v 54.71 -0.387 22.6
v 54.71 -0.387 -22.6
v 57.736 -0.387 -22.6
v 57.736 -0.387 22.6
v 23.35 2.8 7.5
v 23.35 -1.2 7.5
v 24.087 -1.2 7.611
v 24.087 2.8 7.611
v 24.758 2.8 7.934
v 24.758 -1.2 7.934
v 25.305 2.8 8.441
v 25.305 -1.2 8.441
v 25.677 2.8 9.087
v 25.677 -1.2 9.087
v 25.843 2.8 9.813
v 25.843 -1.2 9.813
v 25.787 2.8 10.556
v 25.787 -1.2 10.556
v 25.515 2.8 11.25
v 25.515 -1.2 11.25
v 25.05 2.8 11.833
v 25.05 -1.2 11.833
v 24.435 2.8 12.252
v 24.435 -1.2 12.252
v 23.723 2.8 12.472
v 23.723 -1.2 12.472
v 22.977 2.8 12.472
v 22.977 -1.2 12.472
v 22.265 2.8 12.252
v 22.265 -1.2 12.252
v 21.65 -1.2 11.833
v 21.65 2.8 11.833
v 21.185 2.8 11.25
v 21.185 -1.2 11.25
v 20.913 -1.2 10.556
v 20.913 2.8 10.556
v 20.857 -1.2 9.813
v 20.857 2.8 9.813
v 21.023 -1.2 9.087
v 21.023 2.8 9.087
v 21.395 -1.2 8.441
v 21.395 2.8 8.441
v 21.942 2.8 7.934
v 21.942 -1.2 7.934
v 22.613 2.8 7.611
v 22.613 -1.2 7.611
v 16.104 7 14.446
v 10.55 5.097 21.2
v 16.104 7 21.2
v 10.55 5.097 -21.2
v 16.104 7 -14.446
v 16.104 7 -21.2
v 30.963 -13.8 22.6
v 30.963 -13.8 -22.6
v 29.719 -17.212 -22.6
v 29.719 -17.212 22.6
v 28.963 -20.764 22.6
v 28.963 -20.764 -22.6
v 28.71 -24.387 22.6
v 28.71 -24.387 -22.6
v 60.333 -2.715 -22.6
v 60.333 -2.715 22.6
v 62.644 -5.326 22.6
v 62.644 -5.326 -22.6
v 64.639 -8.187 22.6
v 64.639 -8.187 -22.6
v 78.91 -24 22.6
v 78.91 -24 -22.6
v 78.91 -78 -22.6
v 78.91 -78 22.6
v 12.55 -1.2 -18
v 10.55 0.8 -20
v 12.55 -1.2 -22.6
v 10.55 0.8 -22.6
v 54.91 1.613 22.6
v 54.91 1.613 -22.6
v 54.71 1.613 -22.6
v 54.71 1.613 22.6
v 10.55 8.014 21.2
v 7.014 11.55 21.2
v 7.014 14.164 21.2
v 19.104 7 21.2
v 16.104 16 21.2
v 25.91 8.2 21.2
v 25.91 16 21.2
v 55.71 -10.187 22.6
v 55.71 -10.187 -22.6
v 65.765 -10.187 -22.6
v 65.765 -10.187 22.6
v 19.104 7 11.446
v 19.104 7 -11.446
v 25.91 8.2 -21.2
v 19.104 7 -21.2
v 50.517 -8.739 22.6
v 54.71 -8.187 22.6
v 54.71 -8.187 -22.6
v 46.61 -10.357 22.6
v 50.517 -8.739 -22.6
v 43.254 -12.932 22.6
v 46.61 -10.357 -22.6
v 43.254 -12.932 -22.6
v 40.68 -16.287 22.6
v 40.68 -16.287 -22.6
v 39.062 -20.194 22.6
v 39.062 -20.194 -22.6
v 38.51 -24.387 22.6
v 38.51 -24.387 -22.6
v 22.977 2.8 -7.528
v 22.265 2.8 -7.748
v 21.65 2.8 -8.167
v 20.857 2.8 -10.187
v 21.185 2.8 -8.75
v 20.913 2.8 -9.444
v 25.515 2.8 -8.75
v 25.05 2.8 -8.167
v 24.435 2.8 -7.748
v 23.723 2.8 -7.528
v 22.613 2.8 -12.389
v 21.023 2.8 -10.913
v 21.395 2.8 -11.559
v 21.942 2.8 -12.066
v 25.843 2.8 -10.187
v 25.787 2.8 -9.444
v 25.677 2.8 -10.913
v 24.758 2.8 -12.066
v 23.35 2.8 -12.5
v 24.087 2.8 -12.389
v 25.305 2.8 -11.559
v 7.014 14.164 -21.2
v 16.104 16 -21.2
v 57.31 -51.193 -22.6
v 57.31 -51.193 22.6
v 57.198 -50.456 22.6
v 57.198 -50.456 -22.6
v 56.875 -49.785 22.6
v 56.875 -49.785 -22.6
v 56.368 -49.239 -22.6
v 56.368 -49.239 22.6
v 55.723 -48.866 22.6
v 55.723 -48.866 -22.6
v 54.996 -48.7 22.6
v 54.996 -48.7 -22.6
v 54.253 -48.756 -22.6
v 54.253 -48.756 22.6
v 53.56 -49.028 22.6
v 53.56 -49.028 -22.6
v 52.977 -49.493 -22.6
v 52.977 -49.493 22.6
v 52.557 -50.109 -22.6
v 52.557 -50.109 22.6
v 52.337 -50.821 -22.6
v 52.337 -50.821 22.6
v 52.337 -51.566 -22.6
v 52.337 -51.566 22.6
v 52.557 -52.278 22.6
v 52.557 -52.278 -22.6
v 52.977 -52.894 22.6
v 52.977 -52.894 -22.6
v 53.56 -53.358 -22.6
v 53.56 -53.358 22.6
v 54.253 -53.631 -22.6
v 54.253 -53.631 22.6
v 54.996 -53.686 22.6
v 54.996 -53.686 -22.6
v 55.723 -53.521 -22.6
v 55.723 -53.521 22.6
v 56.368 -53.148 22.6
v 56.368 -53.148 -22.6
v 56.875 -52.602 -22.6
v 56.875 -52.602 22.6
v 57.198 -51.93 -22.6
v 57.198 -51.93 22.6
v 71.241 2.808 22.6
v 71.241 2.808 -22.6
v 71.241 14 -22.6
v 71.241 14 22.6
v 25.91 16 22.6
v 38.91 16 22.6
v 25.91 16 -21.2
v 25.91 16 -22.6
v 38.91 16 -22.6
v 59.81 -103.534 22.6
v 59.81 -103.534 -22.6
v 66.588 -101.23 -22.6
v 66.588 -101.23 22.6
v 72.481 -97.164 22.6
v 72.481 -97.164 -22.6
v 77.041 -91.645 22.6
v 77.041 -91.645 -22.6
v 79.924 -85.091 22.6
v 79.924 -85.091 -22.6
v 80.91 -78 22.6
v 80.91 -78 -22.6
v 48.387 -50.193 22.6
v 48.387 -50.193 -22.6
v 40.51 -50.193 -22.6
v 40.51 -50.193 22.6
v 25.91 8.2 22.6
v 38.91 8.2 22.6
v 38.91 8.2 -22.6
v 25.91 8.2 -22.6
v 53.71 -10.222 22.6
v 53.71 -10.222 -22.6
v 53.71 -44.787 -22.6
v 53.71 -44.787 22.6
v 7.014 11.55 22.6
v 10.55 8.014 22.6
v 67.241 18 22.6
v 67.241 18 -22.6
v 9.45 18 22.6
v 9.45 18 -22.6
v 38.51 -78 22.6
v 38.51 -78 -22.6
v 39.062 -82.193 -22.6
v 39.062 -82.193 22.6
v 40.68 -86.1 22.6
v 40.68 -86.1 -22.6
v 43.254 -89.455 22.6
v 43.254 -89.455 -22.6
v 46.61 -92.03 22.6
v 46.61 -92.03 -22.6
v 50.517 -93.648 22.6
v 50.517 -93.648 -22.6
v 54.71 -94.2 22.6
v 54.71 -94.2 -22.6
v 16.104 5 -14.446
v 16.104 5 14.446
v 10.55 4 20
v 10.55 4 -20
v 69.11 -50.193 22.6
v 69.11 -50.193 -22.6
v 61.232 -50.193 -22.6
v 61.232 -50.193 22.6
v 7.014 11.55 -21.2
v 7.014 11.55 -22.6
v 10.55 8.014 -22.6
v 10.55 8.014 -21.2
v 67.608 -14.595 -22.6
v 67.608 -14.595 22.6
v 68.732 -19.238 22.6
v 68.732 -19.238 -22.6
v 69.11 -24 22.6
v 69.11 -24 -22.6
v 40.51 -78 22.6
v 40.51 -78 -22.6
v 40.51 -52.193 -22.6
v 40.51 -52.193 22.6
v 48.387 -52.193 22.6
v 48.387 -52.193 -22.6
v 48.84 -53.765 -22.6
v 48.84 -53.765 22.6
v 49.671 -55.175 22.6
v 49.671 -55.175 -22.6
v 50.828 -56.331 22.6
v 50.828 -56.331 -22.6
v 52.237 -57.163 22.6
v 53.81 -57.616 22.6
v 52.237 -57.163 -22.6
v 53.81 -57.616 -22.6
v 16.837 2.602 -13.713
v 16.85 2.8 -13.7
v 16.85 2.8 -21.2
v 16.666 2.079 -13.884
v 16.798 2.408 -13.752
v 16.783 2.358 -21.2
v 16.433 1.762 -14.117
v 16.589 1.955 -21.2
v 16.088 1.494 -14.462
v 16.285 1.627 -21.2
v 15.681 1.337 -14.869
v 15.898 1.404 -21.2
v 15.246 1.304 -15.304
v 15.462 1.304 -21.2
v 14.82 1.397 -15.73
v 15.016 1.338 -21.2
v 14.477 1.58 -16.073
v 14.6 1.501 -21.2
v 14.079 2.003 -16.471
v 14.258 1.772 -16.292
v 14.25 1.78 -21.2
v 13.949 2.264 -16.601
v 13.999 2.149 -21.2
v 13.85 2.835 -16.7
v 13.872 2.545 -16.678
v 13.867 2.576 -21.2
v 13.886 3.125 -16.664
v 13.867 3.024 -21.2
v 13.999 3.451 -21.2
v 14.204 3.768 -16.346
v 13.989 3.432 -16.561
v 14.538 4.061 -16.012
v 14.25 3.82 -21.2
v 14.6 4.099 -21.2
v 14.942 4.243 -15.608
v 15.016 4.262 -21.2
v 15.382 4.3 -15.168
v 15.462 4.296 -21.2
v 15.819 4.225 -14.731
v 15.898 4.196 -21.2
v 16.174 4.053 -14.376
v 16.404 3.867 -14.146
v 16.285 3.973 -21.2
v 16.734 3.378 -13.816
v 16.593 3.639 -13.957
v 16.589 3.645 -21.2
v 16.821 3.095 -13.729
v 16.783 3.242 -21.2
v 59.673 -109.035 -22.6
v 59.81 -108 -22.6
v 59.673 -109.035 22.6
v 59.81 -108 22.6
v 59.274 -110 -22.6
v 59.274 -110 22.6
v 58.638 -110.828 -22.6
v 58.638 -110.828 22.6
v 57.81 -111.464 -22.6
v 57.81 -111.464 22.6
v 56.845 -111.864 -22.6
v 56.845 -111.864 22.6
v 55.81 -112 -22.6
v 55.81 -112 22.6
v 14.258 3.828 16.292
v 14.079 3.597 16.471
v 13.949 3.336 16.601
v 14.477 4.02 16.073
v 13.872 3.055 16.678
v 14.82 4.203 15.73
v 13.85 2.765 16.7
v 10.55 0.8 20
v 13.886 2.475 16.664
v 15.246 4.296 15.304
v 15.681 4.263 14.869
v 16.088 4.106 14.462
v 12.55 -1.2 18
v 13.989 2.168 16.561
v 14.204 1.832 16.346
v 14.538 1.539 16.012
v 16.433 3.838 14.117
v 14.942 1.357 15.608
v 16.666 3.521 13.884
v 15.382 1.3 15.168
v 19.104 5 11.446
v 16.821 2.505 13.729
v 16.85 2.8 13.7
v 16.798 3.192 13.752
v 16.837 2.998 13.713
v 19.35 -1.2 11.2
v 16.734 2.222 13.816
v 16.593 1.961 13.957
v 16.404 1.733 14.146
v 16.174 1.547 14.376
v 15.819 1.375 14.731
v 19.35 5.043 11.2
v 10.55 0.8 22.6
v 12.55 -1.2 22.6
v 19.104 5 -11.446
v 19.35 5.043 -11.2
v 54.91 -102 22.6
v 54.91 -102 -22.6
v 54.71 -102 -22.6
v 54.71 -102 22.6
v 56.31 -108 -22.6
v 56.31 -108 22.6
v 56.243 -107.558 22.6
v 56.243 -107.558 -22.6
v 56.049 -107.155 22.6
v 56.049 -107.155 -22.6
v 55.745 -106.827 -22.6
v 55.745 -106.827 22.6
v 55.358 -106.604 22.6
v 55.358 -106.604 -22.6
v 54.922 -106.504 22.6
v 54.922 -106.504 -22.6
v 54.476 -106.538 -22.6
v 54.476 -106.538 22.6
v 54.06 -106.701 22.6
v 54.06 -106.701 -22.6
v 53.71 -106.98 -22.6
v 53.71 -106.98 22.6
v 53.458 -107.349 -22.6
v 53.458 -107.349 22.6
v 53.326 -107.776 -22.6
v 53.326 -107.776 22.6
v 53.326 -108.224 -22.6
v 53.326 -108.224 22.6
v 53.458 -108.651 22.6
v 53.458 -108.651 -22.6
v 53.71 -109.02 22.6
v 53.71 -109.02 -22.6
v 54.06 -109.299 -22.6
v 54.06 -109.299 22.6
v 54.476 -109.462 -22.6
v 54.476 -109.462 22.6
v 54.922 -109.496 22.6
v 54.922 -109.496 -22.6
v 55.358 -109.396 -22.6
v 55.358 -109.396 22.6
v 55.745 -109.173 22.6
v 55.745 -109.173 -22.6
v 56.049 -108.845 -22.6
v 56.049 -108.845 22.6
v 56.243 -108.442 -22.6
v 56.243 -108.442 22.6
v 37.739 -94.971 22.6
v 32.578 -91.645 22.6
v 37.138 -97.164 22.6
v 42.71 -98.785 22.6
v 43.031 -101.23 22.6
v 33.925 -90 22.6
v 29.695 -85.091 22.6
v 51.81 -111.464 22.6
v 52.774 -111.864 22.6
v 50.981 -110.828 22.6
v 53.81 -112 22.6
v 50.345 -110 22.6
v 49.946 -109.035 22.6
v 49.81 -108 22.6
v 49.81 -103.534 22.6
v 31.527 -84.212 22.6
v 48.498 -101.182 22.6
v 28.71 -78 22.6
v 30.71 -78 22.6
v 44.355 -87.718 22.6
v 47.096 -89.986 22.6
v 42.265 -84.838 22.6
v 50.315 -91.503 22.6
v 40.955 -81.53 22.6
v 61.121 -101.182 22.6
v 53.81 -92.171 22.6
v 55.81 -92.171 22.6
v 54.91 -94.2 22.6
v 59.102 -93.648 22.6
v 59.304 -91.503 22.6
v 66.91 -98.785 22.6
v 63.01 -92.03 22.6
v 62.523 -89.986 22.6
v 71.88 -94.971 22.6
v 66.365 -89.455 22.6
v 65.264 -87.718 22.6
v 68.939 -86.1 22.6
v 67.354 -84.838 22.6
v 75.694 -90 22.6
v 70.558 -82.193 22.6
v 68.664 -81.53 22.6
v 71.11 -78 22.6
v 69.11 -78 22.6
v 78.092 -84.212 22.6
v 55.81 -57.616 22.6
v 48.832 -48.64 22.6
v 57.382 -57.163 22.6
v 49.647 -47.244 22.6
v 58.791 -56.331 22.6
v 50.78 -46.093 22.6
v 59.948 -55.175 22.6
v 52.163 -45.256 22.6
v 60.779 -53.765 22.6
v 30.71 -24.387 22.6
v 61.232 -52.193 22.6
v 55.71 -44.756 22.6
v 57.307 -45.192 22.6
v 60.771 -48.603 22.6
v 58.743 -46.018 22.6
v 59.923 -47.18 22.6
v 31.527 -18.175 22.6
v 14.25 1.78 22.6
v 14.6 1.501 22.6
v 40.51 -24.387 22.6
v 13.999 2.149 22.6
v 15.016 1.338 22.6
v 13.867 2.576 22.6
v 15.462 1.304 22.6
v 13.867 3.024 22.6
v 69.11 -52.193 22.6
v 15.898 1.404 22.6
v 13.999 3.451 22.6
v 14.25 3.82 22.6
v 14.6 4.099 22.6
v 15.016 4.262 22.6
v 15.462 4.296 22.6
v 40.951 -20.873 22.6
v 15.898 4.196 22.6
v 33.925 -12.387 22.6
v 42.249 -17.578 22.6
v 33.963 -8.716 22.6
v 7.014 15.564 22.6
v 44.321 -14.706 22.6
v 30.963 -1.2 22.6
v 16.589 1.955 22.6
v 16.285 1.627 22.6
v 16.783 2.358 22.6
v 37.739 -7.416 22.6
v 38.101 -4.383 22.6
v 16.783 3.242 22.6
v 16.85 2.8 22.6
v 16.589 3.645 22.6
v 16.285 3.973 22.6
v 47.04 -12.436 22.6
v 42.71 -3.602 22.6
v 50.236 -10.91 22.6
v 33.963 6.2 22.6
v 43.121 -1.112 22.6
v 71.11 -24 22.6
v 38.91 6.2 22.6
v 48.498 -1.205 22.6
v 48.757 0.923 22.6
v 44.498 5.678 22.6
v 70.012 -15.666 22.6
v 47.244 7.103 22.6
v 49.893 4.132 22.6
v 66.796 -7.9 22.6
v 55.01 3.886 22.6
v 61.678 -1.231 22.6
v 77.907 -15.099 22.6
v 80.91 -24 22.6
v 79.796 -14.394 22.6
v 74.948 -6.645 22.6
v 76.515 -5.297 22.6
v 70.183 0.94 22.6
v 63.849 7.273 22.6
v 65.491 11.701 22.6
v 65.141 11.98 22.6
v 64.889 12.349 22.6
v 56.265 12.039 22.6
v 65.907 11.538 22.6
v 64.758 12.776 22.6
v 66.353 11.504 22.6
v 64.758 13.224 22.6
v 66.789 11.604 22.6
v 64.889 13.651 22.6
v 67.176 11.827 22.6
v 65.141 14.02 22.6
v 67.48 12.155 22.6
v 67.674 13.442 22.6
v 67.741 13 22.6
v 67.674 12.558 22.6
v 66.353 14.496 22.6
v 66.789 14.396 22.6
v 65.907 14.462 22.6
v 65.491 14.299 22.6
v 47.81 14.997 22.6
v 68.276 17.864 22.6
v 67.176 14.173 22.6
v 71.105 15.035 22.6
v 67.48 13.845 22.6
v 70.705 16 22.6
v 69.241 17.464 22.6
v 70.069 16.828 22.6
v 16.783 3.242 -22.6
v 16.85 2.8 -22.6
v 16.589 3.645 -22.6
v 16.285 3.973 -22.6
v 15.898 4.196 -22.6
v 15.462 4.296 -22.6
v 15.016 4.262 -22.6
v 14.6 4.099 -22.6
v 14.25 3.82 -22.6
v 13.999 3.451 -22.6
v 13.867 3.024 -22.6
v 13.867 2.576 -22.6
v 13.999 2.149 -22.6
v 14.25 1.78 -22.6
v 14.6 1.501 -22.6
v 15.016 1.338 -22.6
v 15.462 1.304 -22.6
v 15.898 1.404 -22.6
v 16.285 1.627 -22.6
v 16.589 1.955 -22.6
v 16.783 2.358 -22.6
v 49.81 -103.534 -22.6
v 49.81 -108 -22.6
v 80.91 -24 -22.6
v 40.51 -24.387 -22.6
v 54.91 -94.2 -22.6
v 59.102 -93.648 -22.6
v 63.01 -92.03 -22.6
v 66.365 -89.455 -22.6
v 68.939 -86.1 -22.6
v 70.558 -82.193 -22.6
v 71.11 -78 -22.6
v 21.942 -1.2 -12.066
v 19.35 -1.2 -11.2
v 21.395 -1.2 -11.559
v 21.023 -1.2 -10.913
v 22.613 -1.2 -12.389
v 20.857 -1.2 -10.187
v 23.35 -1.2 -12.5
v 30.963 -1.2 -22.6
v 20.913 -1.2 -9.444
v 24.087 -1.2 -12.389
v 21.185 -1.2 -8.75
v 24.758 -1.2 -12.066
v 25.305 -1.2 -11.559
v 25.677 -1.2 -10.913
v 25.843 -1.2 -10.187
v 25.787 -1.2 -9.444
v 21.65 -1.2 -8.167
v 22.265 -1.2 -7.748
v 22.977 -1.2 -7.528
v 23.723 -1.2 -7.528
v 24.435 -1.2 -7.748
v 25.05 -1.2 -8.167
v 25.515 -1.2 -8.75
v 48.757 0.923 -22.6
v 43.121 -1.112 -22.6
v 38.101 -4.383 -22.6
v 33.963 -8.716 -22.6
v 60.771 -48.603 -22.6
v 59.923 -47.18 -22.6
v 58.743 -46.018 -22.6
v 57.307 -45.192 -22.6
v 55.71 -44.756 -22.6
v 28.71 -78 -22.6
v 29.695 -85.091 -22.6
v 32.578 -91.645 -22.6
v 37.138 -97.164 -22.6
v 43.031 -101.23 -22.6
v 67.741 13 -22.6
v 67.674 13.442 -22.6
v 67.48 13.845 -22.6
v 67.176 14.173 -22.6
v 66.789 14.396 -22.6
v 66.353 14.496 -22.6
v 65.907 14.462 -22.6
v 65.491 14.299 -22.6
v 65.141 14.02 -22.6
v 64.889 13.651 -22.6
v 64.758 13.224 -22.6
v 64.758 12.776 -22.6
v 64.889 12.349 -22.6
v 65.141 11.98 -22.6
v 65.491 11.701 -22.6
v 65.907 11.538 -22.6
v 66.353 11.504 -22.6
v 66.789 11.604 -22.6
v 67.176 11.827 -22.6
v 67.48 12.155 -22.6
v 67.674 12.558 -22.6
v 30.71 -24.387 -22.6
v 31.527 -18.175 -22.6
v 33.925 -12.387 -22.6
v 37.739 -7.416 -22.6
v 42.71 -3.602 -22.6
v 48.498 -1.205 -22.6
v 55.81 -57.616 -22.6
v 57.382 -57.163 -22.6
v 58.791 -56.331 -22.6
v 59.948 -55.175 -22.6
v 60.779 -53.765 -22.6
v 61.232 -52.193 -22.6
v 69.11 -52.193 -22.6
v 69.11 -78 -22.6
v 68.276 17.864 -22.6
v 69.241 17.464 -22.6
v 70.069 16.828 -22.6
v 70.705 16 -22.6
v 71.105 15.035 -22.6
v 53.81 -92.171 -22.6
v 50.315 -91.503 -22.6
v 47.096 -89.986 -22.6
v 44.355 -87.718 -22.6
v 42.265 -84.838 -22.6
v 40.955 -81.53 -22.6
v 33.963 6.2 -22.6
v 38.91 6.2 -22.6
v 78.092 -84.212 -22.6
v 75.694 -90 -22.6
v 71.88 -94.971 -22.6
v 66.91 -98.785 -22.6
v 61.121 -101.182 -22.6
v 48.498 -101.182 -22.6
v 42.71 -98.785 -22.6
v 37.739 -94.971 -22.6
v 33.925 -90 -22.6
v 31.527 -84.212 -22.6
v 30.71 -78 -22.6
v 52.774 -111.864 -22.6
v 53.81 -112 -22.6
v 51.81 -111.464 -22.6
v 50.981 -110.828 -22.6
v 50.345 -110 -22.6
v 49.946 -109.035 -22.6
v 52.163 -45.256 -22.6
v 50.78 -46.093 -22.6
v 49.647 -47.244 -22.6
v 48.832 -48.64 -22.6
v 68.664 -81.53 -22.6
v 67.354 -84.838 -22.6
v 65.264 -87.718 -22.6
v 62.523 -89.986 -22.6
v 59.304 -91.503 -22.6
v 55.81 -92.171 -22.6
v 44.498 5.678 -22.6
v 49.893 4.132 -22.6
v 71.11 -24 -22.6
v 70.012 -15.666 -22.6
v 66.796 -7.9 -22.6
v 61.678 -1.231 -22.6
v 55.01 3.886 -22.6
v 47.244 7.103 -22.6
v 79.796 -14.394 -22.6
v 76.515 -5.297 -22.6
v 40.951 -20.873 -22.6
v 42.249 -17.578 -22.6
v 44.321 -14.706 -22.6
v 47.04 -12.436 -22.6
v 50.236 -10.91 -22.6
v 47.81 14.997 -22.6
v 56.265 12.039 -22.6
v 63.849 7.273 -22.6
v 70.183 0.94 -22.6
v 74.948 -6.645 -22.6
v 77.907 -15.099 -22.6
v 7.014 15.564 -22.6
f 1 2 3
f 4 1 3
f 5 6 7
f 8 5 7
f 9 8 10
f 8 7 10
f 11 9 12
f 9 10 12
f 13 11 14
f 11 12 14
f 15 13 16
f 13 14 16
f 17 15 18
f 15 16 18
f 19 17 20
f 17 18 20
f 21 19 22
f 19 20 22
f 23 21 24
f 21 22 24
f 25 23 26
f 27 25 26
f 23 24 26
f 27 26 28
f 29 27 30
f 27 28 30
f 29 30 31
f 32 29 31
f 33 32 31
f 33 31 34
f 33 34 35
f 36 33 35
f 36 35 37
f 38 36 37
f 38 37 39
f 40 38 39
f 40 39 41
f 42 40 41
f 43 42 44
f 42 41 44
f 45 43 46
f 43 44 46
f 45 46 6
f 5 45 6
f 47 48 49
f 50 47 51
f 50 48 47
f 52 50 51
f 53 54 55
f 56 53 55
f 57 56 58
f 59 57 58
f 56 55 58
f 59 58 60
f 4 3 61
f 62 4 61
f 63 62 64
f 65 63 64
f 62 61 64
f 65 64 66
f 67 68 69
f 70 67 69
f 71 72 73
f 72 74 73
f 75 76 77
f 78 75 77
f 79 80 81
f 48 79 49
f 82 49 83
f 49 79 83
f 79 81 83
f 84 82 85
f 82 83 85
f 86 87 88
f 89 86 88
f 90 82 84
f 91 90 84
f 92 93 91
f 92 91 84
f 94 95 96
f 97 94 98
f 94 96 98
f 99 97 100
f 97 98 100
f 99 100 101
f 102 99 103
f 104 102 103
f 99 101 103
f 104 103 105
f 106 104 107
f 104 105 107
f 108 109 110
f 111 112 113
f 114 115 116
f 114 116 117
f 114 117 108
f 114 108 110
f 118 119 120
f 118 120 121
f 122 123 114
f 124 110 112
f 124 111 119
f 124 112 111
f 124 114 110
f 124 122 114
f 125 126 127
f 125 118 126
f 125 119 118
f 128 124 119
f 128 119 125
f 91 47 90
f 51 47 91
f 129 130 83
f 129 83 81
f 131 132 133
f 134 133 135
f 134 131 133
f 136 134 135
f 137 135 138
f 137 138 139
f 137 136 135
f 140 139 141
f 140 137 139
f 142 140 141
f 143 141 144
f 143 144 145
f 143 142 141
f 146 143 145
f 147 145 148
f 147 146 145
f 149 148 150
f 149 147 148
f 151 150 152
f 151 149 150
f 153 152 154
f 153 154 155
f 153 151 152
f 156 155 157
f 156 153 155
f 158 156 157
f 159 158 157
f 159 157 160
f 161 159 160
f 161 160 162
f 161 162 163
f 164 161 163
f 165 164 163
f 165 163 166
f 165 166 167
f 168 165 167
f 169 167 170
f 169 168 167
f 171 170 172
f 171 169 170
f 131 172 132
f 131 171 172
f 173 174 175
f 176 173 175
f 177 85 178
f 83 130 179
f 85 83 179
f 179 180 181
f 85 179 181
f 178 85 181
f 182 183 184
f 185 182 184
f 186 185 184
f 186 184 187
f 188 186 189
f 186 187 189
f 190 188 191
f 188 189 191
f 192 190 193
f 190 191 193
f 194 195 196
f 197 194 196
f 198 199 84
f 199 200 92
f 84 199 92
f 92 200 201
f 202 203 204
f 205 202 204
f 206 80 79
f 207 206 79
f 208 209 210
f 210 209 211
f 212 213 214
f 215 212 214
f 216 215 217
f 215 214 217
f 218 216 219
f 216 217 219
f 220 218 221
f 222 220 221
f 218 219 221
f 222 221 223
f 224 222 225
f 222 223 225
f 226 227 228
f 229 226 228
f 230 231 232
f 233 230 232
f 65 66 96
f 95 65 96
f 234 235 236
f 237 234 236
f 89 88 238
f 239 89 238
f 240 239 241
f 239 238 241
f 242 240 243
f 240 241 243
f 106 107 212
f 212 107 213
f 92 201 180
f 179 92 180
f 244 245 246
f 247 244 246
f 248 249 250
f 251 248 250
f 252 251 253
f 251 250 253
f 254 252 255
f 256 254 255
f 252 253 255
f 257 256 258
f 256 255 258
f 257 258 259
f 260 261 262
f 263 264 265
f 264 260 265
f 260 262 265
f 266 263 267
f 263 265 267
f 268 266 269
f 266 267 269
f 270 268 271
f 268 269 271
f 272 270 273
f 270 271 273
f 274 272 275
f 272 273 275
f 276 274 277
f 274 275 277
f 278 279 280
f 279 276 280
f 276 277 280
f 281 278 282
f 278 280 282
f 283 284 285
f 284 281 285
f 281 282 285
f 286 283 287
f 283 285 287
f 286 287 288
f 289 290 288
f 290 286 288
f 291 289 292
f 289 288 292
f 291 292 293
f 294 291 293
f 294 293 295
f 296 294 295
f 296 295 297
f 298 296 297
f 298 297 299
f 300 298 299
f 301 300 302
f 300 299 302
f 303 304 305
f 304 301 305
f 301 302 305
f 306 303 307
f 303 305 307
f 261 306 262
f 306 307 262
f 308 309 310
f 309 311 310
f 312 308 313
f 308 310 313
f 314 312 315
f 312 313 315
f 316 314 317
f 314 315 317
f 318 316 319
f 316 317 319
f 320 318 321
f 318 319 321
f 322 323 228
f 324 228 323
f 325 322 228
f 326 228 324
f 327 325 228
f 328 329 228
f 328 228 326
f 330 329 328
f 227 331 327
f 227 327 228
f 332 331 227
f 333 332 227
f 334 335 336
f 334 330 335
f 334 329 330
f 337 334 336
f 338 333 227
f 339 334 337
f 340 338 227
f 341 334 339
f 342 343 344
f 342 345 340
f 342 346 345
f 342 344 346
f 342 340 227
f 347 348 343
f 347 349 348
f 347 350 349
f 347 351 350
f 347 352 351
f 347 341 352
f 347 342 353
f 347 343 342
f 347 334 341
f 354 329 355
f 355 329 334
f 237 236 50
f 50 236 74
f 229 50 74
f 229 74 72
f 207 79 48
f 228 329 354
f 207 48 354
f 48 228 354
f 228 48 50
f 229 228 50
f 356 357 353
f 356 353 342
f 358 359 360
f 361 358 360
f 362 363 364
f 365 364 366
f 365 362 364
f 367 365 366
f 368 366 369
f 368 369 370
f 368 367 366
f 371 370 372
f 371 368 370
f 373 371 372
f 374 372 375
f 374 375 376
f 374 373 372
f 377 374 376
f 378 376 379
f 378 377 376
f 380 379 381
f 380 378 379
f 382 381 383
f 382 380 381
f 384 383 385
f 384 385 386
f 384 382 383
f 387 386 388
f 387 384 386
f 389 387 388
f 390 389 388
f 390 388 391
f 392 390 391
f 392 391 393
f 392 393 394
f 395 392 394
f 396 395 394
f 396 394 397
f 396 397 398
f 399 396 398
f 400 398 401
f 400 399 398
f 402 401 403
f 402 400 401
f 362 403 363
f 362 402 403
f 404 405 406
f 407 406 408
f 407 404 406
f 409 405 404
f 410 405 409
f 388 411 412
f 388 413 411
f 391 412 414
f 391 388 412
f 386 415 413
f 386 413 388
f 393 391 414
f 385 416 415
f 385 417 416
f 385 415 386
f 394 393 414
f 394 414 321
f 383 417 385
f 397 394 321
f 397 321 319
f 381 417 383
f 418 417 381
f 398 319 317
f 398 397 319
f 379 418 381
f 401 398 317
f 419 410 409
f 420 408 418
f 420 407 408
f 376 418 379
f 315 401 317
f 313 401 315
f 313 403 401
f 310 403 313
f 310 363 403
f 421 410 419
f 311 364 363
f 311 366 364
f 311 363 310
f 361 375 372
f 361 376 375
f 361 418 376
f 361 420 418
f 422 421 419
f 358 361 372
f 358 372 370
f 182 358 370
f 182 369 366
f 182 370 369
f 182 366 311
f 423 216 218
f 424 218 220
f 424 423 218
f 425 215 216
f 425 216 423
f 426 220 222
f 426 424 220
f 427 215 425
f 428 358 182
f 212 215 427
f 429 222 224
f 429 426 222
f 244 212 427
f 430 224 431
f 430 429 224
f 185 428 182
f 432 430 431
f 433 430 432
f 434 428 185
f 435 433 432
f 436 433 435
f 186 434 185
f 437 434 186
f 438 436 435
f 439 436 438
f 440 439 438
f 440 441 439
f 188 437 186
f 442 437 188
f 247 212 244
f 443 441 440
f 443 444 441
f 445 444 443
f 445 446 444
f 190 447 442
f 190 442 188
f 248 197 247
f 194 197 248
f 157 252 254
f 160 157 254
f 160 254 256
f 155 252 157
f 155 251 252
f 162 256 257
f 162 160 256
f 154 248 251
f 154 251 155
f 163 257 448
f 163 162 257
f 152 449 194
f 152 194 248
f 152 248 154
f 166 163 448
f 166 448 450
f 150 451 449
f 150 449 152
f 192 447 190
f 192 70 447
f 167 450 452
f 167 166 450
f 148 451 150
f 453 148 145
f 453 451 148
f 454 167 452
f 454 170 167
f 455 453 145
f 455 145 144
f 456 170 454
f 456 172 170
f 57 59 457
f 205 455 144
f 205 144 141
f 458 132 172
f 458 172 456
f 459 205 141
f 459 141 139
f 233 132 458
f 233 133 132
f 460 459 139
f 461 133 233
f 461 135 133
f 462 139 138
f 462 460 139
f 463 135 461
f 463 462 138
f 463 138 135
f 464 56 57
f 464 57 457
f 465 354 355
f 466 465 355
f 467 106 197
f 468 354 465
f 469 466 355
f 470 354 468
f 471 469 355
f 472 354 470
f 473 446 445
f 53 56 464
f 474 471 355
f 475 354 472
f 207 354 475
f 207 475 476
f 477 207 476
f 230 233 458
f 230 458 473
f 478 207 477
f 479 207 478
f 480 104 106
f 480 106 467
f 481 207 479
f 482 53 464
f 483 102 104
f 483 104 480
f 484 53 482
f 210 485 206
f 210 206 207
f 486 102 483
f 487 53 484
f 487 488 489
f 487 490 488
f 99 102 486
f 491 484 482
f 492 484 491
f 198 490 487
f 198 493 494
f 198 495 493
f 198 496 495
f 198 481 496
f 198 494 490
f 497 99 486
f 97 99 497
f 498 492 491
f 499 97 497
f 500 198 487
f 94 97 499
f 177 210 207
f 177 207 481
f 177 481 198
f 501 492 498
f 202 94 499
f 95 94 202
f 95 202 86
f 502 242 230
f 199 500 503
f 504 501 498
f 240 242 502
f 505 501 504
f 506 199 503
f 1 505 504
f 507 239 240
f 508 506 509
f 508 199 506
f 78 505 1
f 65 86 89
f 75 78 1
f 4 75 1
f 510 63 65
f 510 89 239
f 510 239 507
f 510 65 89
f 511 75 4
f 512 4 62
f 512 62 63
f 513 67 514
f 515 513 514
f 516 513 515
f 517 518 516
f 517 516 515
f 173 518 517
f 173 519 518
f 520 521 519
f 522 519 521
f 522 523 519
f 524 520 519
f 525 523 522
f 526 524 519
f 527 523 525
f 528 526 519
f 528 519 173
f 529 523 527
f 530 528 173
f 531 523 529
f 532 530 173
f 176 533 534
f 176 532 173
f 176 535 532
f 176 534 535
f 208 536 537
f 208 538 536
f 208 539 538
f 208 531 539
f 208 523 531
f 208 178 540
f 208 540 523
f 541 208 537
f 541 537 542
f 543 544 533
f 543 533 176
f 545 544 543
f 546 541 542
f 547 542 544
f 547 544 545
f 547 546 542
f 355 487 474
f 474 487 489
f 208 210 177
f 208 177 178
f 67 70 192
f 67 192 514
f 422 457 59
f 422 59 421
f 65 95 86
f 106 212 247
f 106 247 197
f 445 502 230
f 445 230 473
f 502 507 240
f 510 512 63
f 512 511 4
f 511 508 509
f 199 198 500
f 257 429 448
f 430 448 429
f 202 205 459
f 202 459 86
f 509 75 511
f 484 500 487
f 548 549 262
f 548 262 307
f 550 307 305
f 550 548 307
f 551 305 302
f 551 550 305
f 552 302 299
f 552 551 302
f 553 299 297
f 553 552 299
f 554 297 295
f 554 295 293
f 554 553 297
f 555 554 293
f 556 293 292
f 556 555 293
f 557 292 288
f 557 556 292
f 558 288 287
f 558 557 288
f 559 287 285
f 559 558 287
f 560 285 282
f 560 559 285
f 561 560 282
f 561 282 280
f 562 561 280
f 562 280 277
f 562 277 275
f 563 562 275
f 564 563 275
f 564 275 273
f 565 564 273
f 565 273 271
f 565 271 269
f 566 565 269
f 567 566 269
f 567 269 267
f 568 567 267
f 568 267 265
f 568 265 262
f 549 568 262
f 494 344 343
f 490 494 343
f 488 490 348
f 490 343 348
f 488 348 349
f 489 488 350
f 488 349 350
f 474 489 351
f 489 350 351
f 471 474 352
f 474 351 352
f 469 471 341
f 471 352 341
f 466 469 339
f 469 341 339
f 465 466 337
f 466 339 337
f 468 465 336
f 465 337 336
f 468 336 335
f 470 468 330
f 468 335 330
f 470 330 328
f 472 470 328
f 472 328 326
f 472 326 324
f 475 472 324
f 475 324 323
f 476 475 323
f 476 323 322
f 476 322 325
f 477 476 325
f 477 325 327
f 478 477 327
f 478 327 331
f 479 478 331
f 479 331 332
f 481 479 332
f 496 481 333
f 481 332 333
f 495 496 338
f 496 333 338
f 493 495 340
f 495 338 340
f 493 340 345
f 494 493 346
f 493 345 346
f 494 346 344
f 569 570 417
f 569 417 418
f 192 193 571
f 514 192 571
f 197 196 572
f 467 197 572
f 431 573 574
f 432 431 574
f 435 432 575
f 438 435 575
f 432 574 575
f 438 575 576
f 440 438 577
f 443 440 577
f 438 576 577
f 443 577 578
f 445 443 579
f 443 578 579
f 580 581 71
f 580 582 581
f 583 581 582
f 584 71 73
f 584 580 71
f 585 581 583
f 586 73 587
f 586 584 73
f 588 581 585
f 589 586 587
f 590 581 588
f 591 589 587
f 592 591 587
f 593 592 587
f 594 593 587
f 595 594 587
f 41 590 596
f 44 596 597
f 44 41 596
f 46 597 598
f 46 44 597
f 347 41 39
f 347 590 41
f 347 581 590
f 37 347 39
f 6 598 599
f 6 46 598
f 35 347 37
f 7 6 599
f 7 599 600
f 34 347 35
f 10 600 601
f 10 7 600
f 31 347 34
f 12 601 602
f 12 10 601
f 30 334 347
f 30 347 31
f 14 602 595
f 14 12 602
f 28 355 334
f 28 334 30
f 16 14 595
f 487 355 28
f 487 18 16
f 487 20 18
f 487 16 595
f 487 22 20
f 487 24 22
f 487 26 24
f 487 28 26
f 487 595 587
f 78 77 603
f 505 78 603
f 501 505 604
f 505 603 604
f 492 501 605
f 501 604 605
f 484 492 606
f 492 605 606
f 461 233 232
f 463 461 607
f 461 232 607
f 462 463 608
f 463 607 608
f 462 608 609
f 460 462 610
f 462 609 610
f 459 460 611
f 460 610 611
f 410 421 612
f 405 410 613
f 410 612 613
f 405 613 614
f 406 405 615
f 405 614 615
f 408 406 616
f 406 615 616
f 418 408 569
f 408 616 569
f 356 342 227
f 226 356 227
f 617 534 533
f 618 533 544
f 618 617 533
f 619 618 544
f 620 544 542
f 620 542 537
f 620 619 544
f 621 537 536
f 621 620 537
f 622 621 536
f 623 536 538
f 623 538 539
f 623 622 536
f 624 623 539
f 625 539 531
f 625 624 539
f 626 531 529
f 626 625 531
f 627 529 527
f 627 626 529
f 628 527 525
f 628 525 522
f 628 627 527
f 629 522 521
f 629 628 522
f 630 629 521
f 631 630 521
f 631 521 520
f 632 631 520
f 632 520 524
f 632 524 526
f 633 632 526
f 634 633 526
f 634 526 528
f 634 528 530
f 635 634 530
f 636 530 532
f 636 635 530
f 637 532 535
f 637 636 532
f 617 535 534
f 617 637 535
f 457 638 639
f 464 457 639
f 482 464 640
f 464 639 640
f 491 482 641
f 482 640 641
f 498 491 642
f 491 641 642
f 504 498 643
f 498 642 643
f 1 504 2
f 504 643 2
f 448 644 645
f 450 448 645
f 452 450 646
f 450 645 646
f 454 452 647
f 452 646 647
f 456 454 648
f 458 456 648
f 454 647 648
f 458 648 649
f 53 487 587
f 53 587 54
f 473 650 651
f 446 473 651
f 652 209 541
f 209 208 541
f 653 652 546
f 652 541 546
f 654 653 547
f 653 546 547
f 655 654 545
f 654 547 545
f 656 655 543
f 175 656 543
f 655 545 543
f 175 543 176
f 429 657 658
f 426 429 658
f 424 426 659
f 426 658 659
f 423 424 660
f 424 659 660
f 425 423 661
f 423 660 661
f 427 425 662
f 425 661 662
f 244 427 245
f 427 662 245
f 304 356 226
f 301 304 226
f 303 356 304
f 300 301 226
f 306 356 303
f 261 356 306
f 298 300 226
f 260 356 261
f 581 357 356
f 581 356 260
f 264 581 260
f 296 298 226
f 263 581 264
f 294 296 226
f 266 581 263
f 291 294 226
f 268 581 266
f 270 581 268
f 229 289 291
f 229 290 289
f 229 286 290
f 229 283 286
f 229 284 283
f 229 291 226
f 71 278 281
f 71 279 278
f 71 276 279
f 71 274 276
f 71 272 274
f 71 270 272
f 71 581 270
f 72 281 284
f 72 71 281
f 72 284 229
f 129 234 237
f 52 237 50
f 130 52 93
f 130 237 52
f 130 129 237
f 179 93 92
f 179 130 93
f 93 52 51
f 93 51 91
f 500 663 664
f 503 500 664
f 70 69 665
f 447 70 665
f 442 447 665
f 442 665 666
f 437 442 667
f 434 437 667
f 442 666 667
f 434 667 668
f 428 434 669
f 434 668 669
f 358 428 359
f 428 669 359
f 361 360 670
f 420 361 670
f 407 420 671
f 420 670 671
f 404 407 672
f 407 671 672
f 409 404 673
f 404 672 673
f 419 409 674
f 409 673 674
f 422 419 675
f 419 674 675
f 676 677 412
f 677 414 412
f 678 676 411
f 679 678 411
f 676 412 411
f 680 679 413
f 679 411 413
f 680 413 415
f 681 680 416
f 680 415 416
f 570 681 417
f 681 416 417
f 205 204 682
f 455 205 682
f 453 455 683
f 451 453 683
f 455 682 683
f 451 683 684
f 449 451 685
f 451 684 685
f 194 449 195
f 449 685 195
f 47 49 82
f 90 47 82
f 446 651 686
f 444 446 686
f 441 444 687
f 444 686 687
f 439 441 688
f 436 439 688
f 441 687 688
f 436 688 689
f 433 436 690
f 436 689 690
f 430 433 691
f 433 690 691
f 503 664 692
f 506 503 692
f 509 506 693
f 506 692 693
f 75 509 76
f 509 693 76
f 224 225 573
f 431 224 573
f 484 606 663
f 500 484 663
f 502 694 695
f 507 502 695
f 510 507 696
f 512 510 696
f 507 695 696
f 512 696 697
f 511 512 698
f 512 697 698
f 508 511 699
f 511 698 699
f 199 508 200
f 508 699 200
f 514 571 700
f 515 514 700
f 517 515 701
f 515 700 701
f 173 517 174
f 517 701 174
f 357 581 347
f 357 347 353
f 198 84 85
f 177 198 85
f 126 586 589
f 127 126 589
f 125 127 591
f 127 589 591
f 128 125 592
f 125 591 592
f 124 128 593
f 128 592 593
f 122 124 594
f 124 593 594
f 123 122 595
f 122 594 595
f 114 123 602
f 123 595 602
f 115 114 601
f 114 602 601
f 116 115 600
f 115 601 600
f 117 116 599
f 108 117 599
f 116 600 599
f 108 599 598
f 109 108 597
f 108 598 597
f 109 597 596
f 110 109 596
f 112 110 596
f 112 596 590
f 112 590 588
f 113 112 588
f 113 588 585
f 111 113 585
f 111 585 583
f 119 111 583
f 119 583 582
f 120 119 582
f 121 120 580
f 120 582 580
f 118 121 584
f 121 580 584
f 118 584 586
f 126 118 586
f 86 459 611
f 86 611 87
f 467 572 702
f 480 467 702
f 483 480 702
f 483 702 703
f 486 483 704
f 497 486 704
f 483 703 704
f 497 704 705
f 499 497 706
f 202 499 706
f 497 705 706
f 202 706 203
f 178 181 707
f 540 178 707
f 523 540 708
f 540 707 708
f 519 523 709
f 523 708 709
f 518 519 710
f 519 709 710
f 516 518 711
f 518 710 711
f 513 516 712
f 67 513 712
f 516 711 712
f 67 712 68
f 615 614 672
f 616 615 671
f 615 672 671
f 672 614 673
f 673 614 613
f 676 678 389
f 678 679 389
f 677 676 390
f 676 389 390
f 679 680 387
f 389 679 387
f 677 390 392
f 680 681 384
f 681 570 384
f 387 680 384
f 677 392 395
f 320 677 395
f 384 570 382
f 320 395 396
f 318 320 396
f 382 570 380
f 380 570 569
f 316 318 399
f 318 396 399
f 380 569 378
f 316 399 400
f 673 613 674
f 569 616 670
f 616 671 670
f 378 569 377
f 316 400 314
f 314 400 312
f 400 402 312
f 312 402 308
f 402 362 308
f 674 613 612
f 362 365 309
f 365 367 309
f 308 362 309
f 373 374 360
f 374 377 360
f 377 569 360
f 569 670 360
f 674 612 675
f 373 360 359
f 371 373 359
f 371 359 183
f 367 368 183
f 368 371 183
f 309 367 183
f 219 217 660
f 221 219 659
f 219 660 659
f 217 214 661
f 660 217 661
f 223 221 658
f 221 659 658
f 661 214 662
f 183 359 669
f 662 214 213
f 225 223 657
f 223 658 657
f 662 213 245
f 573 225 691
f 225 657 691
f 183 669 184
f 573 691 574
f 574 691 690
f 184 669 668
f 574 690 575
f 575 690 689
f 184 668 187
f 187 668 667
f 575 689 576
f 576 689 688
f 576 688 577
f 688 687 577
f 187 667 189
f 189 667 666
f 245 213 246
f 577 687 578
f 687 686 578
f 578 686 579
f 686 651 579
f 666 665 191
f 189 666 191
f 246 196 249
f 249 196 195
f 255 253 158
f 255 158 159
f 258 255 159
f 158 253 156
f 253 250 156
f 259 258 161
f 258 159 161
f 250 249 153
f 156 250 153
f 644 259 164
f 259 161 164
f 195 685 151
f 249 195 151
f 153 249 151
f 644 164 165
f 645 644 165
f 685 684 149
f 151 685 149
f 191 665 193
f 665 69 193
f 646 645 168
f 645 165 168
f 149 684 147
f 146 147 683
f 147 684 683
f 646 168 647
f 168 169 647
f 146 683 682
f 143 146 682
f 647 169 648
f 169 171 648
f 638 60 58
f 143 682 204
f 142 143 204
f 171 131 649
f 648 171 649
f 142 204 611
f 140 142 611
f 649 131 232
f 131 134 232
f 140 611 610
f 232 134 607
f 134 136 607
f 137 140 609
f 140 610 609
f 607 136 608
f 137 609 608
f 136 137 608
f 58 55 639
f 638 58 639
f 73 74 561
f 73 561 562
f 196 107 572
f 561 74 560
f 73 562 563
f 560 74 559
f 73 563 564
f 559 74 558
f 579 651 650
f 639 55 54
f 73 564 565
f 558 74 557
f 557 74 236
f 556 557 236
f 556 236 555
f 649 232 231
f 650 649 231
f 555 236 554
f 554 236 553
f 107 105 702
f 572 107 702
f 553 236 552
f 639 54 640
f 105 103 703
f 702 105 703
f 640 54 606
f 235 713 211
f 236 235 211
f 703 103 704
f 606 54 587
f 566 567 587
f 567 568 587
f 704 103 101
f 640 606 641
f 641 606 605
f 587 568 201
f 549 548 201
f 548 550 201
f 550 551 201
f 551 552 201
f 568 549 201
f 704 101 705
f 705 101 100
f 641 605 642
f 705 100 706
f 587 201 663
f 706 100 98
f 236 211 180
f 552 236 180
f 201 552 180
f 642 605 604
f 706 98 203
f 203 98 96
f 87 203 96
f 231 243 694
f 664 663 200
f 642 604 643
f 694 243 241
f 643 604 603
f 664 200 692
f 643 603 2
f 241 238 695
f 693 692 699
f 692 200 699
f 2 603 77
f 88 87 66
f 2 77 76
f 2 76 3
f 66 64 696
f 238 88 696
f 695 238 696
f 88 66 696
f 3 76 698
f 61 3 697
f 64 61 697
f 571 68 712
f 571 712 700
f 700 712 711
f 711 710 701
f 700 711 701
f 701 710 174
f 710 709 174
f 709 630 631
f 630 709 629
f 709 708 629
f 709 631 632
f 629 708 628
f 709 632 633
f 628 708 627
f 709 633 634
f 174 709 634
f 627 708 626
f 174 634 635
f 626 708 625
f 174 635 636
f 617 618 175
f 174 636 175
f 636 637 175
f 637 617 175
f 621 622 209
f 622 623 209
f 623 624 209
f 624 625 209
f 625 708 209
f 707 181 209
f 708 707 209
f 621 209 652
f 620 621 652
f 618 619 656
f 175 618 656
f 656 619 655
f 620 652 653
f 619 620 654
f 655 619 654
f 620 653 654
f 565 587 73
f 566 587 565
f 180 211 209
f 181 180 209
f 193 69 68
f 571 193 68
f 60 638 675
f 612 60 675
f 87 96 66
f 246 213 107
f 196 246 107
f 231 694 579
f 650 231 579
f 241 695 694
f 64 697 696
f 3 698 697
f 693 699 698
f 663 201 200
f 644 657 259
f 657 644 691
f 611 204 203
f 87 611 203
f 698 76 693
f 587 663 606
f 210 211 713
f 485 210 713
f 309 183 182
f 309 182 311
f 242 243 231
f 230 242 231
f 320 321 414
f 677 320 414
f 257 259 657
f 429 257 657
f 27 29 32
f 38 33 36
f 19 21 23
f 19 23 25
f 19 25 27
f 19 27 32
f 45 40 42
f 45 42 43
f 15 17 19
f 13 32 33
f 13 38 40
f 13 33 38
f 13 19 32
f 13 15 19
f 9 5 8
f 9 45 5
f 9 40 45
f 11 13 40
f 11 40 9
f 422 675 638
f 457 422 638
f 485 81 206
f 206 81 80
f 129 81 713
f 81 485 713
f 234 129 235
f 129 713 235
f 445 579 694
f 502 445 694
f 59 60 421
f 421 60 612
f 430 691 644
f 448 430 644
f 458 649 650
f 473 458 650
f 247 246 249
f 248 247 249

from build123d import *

# Parameters (mm, degrees)
BOSS_EXTRUDE6_DEPTH      = 22.6
BOSS_EXTRUDE6_DEPTH_BACK = 22.6
SKETCH9_R                = 1.5
BOSS_EXTRUDE7_START      = -22.6
BOSS_EXTRUDE7_OUTLINE_R  = 2.5
BOSS_EXTRUDE7_DEPTH      = 45.2
CUT_EXTRUDE1_DEPTH       = 21.2
CUT_EXTRUDE1_DEPTH_BACK  = 21.2
SKETCH9_30_R             = 1.5
BOSS_EXTRUDE8_DEPTH      = 22.6
BOSS_EXTRUDE8_DEPTH_BACK = 22.6
SKETCH9_31_R             = 1.5
FILLET1_R                = 4
CHAMFER1_SIZE            = 2
CHAMFER2_SIZE            = 10
SKETCH11_R               = 2.5
CUT_EXTRUDE5_DEPTH       = 4


# Read off the part's stored shape, not the designer's step: Boss-Extrude7
with BuildPart() as part:
    # Sketch9 → Boss-Extrude6 (new, two sides: drawn at the far end of the back side and taken through both)
    with BuildSketch(Plane.XY.offset(-BOSS_EXTRUDE6_DEPTH_BACK)):
        Polygon((10.55, -1.2), (30.962513099, -1.2), (30.962513099, 6.2), (25.90954056, 6.2), (25.90954056, 8.2), (25.90954056, 18), (9.45, 18), (7.014466094, 15.564466094), (7.014466094, 11.55), (10.55, 8.014466094), align=None)
        with Locations((15.35, 2.8)):
            Circle(SKETCH9_R, mode=Mode.SUBTRACT)
    extrude(amount=BOSS_EXTRUDE6_DEPTH + BOSS_EXTRUDE6_DEPTH_BACK)

    # Boss-Extrude7 outline → Boss-Extrude7 (add)
    with BuildSketch(Plane.XY.offset(BOSS_EXTRUDE7_START)):
        with BuildLine():
            Line((38.90954056, 18), (25.90954056, 18))
            Line((25.90954056, 18), (25.90954056, 16))
            Line((25.90954056, 16), (38.90954056, 16))
            ThreePointArc((38.90954056, 16), (67.193811807, 4.284271247), (78.90954056, -24))
            Line((78.90954056, -24), (78.90954056, -78))
            ThreePointArc((78.90954056, -78), (71.880103308, -94.970562748), (54.90954056, -102))
            Line((54.90954056, -102), (54.709540559, -102))
            ThreePointArc((54.709540559, -102), (37.738977811, -94.970562748), (30.709540559, -78))
            Line((30.709540559, -78), (30.709540559, -24.386722193))
            ThreePointArc((30.709540559, -24.386722193), (37.738977811, -7.416159445), (54.709540559, -0.386722193))
            Line((54.709540559, -0.386722193), (57.736465726, -0.386722193))
            ThreePointArc((57.736465726, -0.386722193), (61.526284336, -3.986931746), (64.638517317, -8.186722193))
            Line((64.638517317, -8.186722193), (54.709540559, -8.186722193))
            ThreePointArc((54.709540559, -8.186722193), (43.254410704, -12.931592338), (38.509540559, -24.386722193))
            Line((38.509540559, -24.386722193), (38.509540559, -78))
            ThreePointArc((38.509540559, -78), (43.254410704, -89.455129855), (54.709540559, -94.2))
            Line((54.709540559, -94.2), (54.90954056, -94.2))
            ThreePointArc((54.90954056, -94.2), (66.364670415, -89.455129855), (71.10954056, -78))
            Line((71.10954056, -78), (71.10954056, -24))
            ThreePointArc((71.10954056, -24), (61.678378914, -1.231161646), (38.90954056, 8.2))
            Line((38.90954056, 8.2), (25.90954056, 8.2))
            Line((25.90954056, 8.2), (25.90954056, 6.2))
            Line((25.90954056, 6.2), (30.962513099, 6.2))
            Line((30.962513099, 6.2), (30.962513099, -13.8))
            ThreePointArc((30.962513099, -13.8), (29.279020372, -18.974823911), (28.709540559, -24.386722193))
            Line((28.709540559, -24.386722193), (28.709540559, -78))
            ThreePointArc((28.709540559, -78), (36.324764249, -96.384776311), (54.709540559, -104))
            Line((54.709540559, -104), (54.90954056, -104))
            ThreePointArc((54.90954056, -104), (73.29431687, -96.384776311), (80.90954056, -78))
            Line((80.90954056, -78), (80.90954056, -24))
            ThreePointArc((80.90954056, -24), (68.608025369, 5.69848481), (38.90954056, 18))
        make_face()
        with BuildLine():
            Line((40.509540559, -78), (40.509540559, -52.193361097))
            Line((40.509540559, -52.193361097), (48.38692427, -52.193361097))
            ThreePointArc((48.38692427, -52.193361097), (50.213346482, -55.789555174), (53.809540559, -57.615977386))
            Line((53.809540559, -57.615977386), (53.809540559, -92.171450173))
            ThreePointArc((53.809540559, -92.171450173), (44.355314369, -87.717509969), (40.509540559, -78))
        make_face(mode=Mode.SUBTRACT)
        with BuildLine():
            Line((61.232156849, -52.193361097), (69.10954056, -52.193361097))
            Line((69.10954056, -52.193361097), (69.10954056, -78))
            ThreePointArc((69.10954056, -78), (65.26376675, -87.717509969), (55.80954056, -92.171450173))
            Line((55.80954056, -92.171450173), (55.809540559, -57.615977386))
            ThreePointArc((55.809540559, -57.615977386), (59.405734637, -55.789555174), (61.232156849, -52.193361097))
        make_face(mode=Mode.SUBTRACT)
        with Locations((54.809540559, -51.193361097)):
            Circle(BOSS_EXTRUDE7_OUTLINE_R, mode=Mode.SUBTRACT)
        with BuildLine():
            Line((48.38692427, -50.193361097), (40.509540559, -50.193361097))
            Line((40.509540559, -50.193361097), (40.509540559, -24.386722193))
            ThreePointArc((40.509540559, -24.386722193), (44.321085429, -14.705813145), (53.709540559, -10.221977225))
            Line((53.709540559, -10.221977225), (53.709540559, -44.787114146))
            ThreePointArc((53.709540559, -44.787114146), (50.177660219, -46.633132538), (48.38692427, -50.193361097))
        make_face(mode=Mode.SUBTRACT)
        with BuildLine():
            ThreePointArc((38.90954056, 6.2), (47.231770136, 5.030681957), (54.909540559, 1.613277807))
            Line((54.909540559, 1.613277807), (54.709540559, 1.613277807))
            ThreePointArc((54.709540559, 1.613277807), (43.121398237, -1.111951356), (33.962513099, -8.716340846))
            Line((33.962513099, -8.716340846), (33.962513099, 6.2))
            Line((33.962513099, 6.2), (38.90954056, 6.2))
        make_face(mode=Mode.SUBTRACT)
        with BuildLine():
            Line((55.709540559, -10.186722193), (65.765328692, -10.186722193))
            ThreePointArc((65.765328692, -10.186722193), (68.261583092, -16.89383372), (69.10954056, -24))
            Line((69.10954056, -24), (69.10954056, -50.193361097))
            Line((69.10954056, -50.193361097), (61.232156849, -50.193361097))
            ThreePointArc((61.232156849, -50.193361097), (59.369856551, -46.561566838), (55.709540559, -44.755970321))
            Line((55.709540559, -44.755970321), (55.709540559, -10.186722193))
        make_face(mode=Mode.SUBTRACT)
    extrude(amount=BOSS_EXTRUDE7_DEPTH)

    # Sketch9<30> → Cut-Extrude1 (cut, two sides: drawn at the far end of the back side and taken through both)
    # profile 1 of 2: a face of its own
    with BuildSketch(Plane.XY.offset(-CUT_EXTRUDE1_DEPTH_BACK)):
        Polygon((19.104002376, 5), (16.104002376, 5), (10.55, 4), (10.55, -1.2), (19.35, -1.2), (19.35, 5.043376018), align=None)
        with Locations((15.35, 2.8)):
            Circle(SKETCH9_30_R, mode=Mode.SUBTRACT)
    # profile 2 of 2: a face of its own
    with BuildSketch(Plane.XY.offset(-CUT_EXTRUDE1_DEPTH_BACK)):
        Polygon((10.55, 5.097056275), (16.104002376, 7), (19.104002376, 7), (25.90954056, 8.2), (25.90954056, 16), (16.104002376, 16), (7.014466094, 14.164466094), (7.014466094, 11.55), (10.55, 8.014466094), align=None)
    extrude(amount=CUT_EXTRUDE1_DEPTH + CUT_EXTRUDE1_DEPTH_BACK, mode=Mode.SUBTRACT)

    # Sketch9<31> → Boss-Extrude8 (add, two sides: drawn at the far end of the back side and taken through both)
    # profile 1 of 2: a face of its own
    with BuildSketch(Plane.XY.offset(-BOSS_EXTRUDE8_DEPTH_BACK)):
        with BuildLine():
            ThreePointArc((38.90954056, 18), (56.770808698, 14.012828104), (71.240841297, 2.808338118))
            Line((71.240841297, 2.808338118), (71.240841297, 8))
            Line((71.240841297, 8), (71.240841297, 18))
            Line((71.240841297, 18), (38.90954056, 18))
        make_face()
        with Locations((66.240841297, 13)):
            Circle(SKETCH9_31_R, mode=Mode.SUBTRACT)
    # profile 2 of 2: a face of its own
    with BuildSketch(Plane.XY.offset(-BOSS_EXTRUDE8_DEPTH_BACK)):
        with BuildLine():
            Line((54.709540559, -104), (54.90954056, -104))
            ThreePointArc((54.90954056, -104), (57.370590519, -103.88326164), (59.809540559, -103.534094854))
            Line((59.809540559, -103.534094854), (59.809540559, -112))
            Line((59.809540559, -112), (49.809540559, -112))
            Line((49.809540559, -112), (49.809540559, -103.534094854))
            ThreePointArc((49.809540559, -103.534094854), (52.2484906, -103.88326164), (54.709540559, -104))
        make_face()
        with Locations((54.809540559, -108)):
            Circle(SKETCH9_31_R, mode=Mode.SUBTRACT)
    extrude(amount=BOSS_EXTRUDE8_DEPTH + BOSS_EXTRUDE8_DEPTH_BACK)

    # Fillet1
    fillet1_edges = [part.edges().sort_by_distance(p)[0] for p in [
        (71.240841297, 18, 0),
        (59.809540559, -112, 0),
        (49.809540559, -112, 0),
    ]]
    fillet(fillet1_edges, radius=FILLET1_R)

    # Chamfer1
    chamfer1_edges = [part.edges().sort_by_distance(p)[0] for p in [
        (10.55, -1.2, -21.9),
        (10.55, -1.2, 21.9),
    ]]
    chamfer(chamfer1_edges, length=CHAMFER1_SIZE)

    # Chamfer2
    # the kernel refuses this chamfer: 10 mm, written as the material it adds along each edge
    with BuildSketch(Plane(origin=(19.35, -1.2, -21.2), x_dir=(0.027495876610586317, 0, 0.9996219169112968), z_dir=(0, 1, 0))) as chamfer2_piece_1_section:
        Polygon((CHAMFER2_SIZE * 0.999621916911, -CHAMFER2_SIZE * 0.0274958766106), (-CHAMFER2_SIZE * 0.0274958766106, -CHAMFER2_SIZE * 0.999621916911), (0, 0), align=None)
    chamfer2_piece_1 = extrude(amount=31.960205898, mode=Mode.PRIVATE)
    chamfer2_piece_1 = split(chamfer2_piece_1, bisect_by=Plane(origin=(10.55, 0.553309939, -18.301201582), z_dir=(1, 0, 0)), keep=Keep.TOP, mode=Mode.PRIVATE)
    chamfer2_piece_1 = split(chamfer2_piece_1, bisect_by=Plane(origin=(12.972143449, -1.622143449, -18.301201582), z_dir=(0.707106781186546, 0.7071067811865491, 0)), keep=Keep.TOP, mode=Mode.PRIVATE)
    chamfer2_piece_1 = split(chamfer2_piece_1, bisect_by=Plane(origin=(13.271329508, 6.029453592, -18.301201582), z_dir=(0.32412836516113813, -0.9460131092632744, 0)), keep=Keep.TOP, mode=Mode.PRIVATE)
    chamfer2_piece_1 = chamfer2_piece_1 - Plane(origin=(15.35, 2.8, -18.301201582), x_dir=(1, 0, 0), z_dir=(0, 0, -1)) * Cylinder(1.5, 104, mode=Mode.PRIVATE)
    chamfer2_piece_1 = split(chamfer2_piece_1, bisect_by=Plane(origin=(15.147596837, 7, -18.301201582), z_dir=(0, -1, 0)), keep=Keep.TOP, mode=Mode.PRIVATE)
    add(chamfer2_piece_1)
    with BuildSketch(Plane(origin=(19.35, -1.2, 21.2), x_dir=(-0.9996219169112968, 0, 0.027495876610586317), z_dir=(0, 1, 0))) as chamfer2_piece_2_section:
        Polygon((CHAMFER2_SIZE * 0.999621916911, -CHAMFER2_SIZE * 0.0274958766106), (-CHAMFER2_SIZE * 0.0274958766106, -CHAMFER2_SIZE * 0.999621916911), (0, 0), align=None)
    chamfer2_piece_2 = extrude(amount=31.960205898, mode=Mode.PRIVATE)
    chamfer2_piece_2 = split(chamfer2_piece_2, bisect_by=Plane(origin=(12.972143449, -1.622143449, 18.301201581), z_dir=(0.707106781186546, 0.7071067811865491, 0)), keep=Keep.TOP, mode=Mode.PRIVATE)
    chamfer2_piece_2 = split(chamfer2_piece_2, bisect_by=Plane(origin=(10.55, 0.553309939, 18.301201581), z_dir=(1, 0, 0)), keep=Keep.TOP, mode=Mode.PRIVATE)
    chamfer2_piece_2 = chamfer2_piece_2 - Plane(origin=(15.35, 2.8, 18.301201581), x_dir=(1, 0, 0), z_dir=(0, 0, -1)) * Cylinder(1.5, 104, mode=Mode.PRIVATE)
    chamfer2_piece_2 = split(chamfer2_piece_2, bisect_by=Plane(origin=(13.271329509, 6.029453592, 18.301201581), z_dir=(0.32412836516113813, -0.9460131092632744, 0)), keep=Keep.TOP, mode=Mode.PRIVATE)
    chamfer2_piece_2 = split(chamfer2_piece_2, bisect_by=Plane(origin=(15.147596837, 7, 18.301201581), z_dir=(0, -1, 0)), keep=Keep.TOP, mode=Mode.PRIVATE)
    add(chamfer2_piece_2)

    # Sketch11 → Cut-Extrude5 (cut)
    with BuildSketch(Plane.XZ.offset(1.2)):
        with Locations(Location((23.35, 10, 0), (0, 0, 270))):
            Circle(SKETCH11_R)
        with Locations(Location((23.35, -10, 0), (0, 0, 270))):
            Circle(SKETCH11_R)
    extrude(amount=-CUT_EXTRUDE5_DEPTH, mode=Mode.SUBTRACT)


solid = part.part
